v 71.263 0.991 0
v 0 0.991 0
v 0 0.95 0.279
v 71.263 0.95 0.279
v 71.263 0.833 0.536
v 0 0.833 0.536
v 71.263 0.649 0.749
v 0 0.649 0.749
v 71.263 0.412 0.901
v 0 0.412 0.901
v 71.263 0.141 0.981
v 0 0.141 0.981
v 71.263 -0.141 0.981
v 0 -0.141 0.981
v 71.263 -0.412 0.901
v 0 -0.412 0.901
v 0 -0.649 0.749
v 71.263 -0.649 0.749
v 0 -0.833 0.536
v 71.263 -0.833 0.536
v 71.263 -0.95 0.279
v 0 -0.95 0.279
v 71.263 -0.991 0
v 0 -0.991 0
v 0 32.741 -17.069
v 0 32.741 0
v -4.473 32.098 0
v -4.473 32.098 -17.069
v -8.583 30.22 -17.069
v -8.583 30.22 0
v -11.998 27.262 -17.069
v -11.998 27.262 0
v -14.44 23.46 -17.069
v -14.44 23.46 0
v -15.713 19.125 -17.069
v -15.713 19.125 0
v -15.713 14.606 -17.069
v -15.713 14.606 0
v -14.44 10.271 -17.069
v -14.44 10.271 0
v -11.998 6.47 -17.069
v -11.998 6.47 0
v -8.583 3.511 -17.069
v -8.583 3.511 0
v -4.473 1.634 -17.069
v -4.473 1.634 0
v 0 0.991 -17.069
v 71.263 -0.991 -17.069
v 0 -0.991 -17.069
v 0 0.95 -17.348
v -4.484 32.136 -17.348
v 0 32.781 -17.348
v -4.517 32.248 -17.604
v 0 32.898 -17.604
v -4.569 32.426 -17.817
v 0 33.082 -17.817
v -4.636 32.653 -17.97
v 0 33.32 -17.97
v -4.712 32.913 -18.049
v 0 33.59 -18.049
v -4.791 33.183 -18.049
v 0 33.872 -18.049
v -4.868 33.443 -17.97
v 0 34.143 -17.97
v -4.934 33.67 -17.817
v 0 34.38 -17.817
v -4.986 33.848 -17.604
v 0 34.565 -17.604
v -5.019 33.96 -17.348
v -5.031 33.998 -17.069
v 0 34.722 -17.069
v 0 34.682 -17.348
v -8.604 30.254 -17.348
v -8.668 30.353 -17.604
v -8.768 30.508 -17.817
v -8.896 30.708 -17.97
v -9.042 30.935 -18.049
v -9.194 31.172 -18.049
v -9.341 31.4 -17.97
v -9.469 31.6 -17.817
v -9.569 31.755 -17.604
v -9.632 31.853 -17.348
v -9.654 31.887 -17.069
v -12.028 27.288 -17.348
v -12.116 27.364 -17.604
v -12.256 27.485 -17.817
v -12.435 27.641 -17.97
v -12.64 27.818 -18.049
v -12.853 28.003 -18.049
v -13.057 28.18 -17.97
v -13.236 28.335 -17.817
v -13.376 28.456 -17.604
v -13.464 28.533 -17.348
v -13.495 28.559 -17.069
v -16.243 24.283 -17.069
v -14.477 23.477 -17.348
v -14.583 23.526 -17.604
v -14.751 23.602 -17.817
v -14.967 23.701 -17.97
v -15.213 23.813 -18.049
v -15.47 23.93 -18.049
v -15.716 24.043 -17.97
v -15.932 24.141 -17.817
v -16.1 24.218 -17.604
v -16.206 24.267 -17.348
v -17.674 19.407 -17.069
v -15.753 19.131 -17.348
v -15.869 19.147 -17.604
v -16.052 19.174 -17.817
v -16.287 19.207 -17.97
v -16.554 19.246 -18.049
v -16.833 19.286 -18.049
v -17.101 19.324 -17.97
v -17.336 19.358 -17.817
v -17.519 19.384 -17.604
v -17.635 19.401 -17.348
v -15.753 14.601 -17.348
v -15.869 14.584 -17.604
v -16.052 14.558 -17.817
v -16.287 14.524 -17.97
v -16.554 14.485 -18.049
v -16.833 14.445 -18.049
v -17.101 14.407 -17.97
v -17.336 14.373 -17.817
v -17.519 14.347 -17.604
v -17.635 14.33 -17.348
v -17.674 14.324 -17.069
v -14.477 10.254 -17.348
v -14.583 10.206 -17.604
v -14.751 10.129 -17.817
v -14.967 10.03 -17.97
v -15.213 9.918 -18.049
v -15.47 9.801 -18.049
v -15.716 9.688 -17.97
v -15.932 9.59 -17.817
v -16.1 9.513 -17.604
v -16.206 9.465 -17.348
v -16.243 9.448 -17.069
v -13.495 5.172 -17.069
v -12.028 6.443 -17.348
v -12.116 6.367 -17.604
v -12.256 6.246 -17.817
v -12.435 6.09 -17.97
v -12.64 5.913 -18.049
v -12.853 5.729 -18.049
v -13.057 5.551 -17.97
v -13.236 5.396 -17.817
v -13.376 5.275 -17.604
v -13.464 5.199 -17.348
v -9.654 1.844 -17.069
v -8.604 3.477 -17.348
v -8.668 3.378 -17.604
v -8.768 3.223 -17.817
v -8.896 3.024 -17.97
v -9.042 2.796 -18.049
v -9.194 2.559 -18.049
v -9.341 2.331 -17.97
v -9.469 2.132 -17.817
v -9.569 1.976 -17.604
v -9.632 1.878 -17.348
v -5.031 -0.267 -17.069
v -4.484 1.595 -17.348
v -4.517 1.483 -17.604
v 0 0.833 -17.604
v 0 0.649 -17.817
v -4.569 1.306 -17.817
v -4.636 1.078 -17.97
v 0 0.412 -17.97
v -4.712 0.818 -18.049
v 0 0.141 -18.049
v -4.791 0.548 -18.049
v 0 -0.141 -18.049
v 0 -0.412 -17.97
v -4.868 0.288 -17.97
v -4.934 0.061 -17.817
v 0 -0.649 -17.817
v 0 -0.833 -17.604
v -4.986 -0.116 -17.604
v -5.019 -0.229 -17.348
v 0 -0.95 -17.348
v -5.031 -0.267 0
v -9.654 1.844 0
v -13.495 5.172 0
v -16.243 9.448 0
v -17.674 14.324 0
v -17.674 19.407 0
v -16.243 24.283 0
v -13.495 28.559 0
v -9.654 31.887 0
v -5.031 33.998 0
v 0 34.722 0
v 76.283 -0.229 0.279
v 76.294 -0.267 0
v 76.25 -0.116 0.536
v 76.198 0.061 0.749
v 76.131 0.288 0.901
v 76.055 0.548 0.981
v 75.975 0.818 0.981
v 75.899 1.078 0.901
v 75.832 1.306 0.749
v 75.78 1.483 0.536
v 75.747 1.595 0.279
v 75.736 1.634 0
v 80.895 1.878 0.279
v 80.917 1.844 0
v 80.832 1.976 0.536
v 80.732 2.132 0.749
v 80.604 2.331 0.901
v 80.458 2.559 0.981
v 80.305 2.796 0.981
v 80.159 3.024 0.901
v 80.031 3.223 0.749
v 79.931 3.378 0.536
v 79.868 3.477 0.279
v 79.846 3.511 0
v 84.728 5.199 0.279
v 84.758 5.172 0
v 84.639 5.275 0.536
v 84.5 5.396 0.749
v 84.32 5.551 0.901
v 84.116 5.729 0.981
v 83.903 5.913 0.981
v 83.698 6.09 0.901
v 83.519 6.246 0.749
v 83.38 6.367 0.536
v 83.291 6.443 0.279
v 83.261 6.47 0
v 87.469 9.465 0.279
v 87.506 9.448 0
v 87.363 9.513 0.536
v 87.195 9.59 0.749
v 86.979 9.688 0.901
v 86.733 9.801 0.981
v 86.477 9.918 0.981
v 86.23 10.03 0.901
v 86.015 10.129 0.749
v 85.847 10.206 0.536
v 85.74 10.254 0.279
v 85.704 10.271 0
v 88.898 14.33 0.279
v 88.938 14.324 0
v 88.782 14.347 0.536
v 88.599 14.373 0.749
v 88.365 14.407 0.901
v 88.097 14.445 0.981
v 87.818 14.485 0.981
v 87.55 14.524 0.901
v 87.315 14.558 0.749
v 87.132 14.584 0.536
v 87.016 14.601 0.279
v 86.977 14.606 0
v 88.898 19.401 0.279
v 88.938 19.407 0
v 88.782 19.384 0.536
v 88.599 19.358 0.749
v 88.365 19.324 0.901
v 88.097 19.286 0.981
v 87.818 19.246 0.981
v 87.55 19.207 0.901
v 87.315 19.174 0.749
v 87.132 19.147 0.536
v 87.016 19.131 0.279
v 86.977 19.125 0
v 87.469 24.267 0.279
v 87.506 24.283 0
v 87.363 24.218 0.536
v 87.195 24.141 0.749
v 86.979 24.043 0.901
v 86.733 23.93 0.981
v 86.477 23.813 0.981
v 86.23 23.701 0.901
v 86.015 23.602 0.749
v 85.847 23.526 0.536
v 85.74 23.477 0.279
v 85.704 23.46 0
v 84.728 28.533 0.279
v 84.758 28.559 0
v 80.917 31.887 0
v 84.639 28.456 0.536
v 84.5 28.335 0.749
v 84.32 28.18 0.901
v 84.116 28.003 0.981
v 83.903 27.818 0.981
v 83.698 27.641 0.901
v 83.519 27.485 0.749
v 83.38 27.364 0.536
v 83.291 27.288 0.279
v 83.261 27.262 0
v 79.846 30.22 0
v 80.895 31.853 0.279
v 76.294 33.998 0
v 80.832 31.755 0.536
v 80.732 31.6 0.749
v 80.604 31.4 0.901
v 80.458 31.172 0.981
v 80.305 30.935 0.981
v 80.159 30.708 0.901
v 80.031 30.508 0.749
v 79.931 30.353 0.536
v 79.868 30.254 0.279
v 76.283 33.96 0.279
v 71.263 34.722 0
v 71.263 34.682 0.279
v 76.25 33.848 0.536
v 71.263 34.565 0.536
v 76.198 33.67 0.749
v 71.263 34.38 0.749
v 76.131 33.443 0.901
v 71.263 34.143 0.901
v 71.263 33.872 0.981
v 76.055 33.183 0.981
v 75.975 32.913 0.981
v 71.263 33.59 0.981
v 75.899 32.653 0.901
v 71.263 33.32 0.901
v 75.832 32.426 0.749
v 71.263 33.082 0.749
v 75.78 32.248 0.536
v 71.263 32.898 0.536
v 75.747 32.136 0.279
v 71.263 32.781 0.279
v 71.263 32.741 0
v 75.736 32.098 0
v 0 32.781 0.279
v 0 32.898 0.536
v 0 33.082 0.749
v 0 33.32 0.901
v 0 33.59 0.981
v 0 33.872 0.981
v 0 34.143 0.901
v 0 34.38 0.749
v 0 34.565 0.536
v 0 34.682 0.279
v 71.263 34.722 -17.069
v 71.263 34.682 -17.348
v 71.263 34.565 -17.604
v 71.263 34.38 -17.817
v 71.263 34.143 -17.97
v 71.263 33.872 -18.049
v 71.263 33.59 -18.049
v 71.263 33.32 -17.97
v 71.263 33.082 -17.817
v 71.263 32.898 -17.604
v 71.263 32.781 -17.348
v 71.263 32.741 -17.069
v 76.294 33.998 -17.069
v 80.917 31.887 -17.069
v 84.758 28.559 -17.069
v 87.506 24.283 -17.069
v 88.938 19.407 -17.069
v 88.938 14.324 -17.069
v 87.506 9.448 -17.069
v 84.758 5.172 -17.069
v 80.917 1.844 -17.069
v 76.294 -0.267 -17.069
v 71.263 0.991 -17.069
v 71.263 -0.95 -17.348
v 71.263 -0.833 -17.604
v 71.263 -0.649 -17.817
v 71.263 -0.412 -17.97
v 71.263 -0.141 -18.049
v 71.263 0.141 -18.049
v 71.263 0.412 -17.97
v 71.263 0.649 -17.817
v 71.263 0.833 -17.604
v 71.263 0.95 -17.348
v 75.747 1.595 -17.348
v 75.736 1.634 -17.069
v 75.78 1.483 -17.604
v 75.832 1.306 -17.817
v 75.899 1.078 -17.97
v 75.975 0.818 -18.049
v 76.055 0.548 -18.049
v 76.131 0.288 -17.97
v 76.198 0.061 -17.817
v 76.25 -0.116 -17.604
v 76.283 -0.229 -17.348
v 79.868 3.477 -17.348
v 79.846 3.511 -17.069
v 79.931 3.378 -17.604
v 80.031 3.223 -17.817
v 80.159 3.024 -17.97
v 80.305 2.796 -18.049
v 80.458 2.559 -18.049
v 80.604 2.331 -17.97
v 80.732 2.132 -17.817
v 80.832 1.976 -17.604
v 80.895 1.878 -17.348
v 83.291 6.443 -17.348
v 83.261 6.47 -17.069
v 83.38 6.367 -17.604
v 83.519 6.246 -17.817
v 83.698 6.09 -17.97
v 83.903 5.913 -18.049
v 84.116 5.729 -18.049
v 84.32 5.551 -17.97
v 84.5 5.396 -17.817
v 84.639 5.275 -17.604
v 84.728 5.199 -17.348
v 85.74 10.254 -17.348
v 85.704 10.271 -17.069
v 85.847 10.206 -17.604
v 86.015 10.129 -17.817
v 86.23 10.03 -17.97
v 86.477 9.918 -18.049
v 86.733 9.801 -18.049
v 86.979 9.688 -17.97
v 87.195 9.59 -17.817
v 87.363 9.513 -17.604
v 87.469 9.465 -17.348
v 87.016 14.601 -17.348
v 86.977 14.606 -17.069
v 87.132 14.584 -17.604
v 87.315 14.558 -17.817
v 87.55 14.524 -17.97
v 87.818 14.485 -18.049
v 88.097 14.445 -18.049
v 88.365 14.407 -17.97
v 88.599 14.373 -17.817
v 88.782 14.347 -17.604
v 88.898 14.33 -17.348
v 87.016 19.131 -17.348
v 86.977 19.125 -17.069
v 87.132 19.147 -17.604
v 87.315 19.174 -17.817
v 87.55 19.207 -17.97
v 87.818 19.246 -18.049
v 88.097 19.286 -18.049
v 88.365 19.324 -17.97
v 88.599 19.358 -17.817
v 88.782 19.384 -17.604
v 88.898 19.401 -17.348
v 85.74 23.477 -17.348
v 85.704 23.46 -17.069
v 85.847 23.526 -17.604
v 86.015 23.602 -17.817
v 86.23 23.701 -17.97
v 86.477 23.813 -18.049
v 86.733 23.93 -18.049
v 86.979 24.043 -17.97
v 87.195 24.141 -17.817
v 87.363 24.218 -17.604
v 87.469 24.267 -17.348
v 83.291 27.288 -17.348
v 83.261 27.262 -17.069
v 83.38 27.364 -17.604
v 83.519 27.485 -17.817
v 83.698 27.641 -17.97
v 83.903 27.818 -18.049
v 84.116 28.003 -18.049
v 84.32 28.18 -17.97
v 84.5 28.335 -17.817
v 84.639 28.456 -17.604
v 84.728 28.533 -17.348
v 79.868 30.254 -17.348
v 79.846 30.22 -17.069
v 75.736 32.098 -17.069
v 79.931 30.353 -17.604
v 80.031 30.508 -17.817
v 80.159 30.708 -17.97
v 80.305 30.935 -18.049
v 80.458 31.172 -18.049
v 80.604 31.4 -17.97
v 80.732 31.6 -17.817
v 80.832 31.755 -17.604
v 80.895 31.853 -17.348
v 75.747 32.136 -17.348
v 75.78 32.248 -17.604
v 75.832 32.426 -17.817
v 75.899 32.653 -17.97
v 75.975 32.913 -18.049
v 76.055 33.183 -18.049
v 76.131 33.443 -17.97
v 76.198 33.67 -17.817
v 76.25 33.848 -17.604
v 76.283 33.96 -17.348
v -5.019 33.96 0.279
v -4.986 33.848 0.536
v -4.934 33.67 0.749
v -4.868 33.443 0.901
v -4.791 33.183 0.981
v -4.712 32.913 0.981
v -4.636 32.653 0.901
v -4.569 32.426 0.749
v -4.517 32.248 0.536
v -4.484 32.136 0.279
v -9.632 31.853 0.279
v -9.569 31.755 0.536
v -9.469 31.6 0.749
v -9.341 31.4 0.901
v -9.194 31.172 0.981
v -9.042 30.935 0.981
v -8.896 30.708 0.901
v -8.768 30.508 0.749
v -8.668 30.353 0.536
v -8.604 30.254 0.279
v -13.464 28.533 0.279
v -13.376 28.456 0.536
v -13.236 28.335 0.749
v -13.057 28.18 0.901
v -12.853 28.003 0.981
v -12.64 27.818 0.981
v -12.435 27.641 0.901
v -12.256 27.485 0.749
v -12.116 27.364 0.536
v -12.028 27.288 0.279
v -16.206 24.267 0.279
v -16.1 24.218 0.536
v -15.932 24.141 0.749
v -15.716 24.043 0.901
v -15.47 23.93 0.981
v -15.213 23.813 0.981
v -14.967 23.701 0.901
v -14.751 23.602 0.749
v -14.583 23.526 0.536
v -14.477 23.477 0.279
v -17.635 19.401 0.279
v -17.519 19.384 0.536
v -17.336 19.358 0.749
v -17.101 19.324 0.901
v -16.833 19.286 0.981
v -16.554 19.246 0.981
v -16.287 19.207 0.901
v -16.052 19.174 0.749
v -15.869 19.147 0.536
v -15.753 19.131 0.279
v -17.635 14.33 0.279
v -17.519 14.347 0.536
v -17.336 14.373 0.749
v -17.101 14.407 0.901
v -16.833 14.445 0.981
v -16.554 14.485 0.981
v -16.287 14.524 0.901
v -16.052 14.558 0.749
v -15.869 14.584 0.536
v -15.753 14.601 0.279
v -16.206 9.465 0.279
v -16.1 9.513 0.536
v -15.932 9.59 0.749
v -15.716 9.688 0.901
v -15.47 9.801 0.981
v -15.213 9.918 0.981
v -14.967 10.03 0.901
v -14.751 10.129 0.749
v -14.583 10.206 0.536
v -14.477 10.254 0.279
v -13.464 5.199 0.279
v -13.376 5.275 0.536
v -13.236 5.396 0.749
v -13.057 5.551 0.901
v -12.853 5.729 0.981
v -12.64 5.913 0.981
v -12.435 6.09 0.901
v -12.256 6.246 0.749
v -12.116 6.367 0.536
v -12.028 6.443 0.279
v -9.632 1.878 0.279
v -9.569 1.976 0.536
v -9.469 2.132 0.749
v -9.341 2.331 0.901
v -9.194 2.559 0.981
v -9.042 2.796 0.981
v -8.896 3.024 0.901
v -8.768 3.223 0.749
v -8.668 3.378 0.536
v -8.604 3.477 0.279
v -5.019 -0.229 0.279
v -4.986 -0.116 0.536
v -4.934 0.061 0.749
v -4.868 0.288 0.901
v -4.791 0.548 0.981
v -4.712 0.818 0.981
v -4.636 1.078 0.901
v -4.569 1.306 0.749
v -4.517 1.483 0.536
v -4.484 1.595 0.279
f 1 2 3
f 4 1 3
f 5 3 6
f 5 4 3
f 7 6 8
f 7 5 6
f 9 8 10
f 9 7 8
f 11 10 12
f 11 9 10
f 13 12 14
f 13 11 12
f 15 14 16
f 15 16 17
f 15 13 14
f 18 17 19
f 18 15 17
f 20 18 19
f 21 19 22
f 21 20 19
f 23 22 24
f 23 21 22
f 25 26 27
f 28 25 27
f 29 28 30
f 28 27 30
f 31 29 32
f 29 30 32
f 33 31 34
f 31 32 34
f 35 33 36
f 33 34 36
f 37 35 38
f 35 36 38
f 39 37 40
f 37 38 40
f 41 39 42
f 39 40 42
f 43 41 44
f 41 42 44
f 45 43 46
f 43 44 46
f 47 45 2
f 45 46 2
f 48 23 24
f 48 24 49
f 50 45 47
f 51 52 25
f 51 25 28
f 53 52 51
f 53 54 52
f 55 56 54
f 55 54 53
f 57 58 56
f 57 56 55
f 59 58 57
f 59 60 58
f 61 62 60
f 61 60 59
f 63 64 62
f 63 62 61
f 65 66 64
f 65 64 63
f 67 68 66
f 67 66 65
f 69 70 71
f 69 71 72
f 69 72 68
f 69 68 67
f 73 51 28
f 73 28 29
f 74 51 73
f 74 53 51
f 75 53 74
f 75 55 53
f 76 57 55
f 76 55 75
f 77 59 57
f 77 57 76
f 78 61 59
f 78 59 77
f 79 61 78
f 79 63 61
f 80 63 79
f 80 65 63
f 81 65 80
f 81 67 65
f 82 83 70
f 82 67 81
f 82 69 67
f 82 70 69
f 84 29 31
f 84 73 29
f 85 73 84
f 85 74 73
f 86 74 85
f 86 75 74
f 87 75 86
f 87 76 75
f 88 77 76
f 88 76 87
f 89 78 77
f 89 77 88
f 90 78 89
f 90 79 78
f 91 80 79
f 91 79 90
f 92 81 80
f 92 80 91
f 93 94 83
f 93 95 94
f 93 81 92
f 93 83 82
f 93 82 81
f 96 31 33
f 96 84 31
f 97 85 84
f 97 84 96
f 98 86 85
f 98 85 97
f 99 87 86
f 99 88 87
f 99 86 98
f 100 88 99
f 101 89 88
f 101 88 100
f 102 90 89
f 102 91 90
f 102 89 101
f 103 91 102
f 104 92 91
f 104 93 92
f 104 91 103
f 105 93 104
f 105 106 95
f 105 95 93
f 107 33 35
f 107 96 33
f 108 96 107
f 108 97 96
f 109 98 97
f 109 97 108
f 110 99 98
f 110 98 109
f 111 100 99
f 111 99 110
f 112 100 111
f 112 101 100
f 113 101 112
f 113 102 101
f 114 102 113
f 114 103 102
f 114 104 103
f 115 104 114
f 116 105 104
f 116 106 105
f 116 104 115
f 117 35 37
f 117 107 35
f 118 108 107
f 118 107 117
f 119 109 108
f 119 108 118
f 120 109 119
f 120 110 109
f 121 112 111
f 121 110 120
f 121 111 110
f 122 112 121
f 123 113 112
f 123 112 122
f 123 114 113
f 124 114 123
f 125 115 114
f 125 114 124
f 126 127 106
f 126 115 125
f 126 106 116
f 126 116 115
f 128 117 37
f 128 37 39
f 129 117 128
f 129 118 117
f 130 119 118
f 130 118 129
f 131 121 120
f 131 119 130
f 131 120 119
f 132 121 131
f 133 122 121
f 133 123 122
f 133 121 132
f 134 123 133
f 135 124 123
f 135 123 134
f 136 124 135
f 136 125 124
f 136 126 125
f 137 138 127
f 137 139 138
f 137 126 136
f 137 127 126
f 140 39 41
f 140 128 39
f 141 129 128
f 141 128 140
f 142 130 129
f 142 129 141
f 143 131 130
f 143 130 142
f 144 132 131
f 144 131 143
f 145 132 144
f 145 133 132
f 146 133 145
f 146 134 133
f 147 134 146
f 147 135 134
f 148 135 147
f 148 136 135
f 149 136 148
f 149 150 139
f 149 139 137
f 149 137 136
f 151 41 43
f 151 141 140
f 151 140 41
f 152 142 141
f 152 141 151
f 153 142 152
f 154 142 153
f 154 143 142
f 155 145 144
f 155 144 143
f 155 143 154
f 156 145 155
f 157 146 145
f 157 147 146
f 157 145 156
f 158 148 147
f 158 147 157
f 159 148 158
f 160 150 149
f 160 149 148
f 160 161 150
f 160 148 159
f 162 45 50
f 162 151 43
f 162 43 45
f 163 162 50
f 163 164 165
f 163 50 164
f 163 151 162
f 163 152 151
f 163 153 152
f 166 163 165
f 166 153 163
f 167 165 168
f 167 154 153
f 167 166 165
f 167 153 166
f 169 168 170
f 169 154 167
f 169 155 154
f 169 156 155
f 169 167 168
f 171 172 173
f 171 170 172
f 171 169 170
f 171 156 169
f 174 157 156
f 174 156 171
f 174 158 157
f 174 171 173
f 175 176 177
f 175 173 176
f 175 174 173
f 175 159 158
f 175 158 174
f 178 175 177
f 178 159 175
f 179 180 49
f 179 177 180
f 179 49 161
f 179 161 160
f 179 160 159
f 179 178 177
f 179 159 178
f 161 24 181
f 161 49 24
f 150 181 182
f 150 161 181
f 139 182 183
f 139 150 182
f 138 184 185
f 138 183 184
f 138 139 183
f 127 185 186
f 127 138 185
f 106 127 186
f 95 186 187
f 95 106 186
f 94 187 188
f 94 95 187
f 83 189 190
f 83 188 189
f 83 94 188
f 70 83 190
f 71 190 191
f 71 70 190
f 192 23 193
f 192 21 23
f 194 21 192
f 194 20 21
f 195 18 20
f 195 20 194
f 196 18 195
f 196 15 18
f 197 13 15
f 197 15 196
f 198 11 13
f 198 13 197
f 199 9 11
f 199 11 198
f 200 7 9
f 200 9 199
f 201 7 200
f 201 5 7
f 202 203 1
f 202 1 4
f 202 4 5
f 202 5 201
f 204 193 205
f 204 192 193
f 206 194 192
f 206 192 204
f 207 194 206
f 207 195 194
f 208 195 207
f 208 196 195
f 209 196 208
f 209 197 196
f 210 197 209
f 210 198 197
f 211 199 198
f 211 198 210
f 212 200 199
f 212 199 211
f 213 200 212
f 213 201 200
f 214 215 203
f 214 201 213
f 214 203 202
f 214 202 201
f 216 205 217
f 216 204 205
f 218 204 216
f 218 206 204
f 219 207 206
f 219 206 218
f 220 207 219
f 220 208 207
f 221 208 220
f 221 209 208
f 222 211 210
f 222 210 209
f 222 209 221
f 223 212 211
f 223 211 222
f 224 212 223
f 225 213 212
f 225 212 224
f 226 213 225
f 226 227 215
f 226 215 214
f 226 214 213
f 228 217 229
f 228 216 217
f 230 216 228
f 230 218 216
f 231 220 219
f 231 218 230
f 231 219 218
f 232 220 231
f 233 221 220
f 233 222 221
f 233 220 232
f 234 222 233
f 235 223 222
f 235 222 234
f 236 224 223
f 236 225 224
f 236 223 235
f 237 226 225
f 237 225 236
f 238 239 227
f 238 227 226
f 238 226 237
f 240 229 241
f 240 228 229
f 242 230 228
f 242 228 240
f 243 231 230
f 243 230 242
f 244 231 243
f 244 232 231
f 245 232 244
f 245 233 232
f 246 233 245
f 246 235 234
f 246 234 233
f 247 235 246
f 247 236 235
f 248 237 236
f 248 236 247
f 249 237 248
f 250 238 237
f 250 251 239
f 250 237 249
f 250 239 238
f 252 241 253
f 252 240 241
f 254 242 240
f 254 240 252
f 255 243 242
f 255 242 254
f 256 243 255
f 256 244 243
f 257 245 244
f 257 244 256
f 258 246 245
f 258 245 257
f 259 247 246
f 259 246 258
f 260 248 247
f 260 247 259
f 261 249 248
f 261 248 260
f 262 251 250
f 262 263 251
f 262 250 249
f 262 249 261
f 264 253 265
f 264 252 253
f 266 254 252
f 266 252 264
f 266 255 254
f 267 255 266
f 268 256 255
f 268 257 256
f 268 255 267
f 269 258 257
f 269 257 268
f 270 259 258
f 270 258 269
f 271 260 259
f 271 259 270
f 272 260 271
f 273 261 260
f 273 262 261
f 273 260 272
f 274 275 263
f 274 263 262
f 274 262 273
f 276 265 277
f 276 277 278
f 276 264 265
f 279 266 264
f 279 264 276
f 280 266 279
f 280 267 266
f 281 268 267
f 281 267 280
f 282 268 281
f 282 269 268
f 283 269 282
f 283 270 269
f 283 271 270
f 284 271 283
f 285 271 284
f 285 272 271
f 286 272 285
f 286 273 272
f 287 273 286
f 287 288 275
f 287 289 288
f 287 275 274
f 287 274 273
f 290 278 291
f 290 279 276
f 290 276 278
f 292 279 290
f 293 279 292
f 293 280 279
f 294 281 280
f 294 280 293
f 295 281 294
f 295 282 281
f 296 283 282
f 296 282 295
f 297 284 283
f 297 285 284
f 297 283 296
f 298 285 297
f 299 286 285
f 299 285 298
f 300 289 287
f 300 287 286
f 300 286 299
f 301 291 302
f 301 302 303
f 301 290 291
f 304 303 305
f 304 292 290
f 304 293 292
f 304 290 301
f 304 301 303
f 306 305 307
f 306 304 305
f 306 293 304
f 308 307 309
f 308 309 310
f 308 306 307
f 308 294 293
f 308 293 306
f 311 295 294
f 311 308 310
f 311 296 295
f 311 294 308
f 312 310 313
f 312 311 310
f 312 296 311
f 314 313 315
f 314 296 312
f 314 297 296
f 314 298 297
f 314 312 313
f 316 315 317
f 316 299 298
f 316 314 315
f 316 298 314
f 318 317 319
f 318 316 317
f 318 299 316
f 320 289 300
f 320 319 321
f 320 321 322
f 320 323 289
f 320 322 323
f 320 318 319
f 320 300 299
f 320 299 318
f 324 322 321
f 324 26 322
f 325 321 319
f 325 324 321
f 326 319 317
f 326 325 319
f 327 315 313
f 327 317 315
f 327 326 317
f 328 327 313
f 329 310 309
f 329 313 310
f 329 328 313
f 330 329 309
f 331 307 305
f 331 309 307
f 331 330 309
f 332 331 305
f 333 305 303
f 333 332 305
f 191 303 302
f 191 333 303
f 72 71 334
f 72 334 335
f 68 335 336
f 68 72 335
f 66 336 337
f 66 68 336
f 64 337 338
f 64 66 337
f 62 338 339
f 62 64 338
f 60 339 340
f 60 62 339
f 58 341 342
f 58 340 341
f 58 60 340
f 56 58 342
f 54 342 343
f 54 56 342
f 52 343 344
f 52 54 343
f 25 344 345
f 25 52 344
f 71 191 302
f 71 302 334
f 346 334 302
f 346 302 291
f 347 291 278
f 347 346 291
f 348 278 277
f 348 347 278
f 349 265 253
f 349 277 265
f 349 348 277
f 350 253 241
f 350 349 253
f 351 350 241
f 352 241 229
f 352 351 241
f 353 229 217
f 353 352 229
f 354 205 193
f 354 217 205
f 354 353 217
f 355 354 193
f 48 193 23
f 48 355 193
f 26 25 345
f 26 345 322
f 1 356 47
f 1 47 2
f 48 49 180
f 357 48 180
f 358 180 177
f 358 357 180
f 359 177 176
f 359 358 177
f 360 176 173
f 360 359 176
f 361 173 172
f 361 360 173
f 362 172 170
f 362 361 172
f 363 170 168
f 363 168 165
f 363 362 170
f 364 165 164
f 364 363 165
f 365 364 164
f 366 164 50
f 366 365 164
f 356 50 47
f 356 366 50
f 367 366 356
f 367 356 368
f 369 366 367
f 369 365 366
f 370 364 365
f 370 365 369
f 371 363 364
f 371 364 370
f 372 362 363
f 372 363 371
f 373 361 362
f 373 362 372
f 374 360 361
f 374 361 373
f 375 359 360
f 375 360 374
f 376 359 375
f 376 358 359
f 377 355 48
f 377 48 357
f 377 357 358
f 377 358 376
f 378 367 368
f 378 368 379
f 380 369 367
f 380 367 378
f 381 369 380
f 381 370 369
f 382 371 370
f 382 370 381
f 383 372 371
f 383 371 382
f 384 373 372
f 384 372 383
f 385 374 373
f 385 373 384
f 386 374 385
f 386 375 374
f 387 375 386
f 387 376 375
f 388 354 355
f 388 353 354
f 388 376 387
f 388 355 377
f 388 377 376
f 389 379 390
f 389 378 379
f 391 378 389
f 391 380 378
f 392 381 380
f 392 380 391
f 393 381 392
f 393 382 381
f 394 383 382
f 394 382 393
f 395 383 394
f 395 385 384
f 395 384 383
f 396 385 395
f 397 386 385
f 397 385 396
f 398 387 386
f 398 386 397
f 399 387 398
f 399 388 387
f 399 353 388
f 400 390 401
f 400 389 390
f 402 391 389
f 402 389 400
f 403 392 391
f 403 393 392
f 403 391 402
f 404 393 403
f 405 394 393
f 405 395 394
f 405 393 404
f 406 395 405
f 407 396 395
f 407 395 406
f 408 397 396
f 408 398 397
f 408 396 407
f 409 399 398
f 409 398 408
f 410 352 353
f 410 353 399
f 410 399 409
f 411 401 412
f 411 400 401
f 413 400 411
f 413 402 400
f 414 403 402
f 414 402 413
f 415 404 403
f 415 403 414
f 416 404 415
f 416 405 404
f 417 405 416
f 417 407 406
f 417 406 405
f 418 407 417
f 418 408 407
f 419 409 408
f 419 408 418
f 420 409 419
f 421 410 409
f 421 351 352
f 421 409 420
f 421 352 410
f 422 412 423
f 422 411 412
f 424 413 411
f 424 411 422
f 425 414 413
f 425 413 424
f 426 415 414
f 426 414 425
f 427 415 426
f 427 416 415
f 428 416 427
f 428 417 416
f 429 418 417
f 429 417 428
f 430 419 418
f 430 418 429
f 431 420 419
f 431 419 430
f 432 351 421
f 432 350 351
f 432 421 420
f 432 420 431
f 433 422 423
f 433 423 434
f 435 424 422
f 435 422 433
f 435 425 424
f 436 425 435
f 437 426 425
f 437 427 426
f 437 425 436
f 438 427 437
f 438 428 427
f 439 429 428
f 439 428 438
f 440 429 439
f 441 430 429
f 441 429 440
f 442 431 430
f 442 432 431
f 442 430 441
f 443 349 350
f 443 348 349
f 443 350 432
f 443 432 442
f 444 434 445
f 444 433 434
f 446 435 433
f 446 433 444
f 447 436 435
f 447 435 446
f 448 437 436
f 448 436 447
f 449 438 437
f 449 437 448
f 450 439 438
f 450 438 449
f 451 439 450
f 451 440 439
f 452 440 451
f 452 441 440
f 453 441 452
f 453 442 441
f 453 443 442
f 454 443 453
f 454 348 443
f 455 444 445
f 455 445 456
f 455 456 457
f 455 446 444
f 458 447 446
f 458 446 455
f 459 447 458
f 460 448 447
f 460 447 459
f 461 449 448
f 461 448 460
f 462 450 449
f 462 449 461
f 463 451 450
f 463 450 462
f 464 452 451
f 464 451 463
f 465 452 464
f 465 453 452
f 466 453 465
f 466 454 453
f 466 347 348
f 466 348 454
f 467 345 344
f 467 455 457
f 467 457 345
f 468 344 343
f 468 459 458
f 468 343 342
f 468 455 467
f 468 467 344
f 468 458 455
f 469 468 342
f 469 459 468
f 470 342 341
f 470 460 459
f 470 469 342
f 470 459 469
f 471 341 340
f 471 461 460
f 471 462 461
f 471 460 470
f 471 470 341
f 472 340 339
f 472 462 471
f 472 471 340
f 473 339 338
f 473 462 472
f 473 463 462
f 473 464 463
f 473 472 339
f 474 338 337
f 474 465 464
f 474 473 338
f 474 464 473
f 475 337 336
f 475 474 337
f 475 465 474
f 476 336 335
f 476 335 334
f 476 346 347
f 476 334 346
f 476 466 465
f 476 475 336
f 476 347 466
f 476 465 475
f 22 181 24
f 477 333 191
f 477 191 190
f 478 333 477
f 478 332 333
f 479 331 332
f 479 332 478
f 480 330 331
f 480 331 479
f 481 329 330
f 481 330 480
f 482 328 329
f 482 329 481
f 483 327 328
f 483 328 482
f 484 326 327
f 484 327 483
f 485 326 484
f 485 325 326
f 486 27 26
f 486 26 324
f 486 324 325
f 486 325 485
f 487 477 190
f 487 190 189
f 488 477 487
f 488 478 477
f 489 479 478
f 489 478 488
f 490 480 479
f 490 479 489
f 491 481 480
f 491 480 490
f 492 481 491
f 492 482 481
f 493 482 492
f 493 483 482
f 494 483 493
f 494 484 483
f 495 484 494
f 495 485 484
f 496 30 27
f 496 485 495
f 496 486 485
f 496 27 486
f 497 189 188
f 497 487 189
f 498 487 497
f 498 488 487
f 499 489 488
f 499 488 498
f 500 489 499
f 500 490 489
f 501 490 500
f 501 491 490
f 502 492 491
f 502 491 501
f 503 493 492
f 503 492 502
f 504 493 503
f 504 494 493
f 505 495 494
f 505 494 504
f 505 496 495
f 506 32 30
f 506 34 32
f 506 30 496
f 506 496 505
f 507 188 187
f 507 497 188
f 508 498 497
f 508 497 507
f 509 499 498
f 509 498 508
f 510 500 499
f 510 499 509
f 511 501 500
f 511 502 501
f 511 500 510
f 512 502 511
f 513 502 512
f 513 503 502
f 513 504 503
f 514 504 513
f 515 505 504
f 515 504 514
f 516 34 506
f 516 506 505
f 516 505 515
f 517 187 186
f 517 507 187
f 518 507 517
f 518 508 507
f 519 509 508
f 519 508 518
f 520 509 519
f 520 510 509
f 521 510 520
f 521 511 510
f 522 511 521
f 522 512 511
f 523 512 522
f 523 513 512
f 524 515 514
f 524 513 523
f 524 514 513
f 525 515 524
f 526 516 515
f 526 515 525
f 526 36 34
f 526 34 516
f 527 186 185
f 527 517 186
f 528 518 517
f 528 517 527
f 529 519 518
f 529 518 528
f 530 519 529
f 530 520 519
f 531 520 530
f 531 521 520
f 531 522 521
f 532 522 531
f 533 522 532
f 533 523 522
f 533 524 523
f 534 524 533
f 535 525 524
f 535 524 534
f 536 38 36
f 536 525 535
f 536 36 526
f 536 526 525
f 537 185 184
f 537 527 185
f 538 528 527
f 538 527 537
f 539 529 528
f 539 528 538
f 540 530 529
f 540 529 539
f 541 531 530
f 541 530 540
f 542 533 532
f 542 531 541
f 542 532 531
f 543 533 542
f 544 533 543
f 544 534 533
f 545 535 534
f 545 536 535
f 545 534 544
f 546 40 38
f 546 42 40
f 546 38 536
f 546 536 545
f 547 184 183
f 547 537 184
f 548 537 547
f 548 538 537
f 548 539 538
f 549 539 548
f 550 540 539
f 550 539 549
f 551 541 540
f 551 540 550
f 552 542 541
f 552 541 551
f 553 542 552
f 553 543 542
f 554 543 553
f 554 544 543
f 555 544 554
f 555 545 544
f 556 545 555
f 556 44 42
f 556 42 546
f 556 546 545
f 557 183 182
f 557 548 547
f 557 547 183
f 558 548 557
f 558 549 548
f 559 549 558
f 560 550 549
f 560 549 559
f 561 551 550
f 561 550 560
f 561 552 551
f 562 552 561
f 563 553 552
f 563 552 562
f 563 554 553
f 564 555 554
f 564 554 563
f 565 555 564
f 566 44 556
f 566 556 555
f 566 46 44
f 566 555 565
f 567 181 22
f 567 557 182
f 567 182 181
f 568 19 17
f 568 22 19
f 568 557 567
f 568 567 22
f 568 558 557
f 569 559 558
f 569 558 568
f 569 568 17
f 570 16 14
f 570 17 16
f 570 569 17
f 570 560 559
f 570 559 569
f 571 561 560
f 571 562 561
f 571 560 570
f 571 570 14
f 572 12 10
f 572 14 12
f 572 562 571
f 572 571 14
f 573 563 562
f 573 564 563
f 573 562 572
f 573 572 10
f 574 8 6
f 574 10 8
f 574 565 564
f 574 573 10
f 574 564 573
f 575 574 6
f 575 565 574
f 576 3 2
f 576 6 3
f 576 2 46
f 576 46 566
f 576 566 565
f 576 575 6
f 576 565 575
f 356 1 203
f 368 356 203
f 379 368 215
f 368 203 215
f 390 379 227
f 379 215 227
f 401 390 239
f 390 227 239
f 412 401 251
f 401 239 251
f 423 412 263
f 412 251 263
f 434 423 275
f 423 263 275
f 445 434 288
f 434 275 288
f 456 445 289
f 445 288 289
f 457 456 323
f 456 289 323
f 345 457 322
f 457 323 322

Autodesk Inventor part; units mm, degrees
ref_plane "YZ Plane" through (0, 0, 0) normal (1, 0, 0) x (0, 1, 0)
ref_plane "XZ Plane" through (0, 0, 0) normal (0, 1, 0) x (-1, 0, 0)
ref_plane "XY Plane" through (0, 0, 0) normal (0, 0, 1) x (1, 0, 0)
sketch "Sketch1" plane through (0, 0, 0) normal (0, 0, 1) x (1, 0, 0)
  line L0 (0, 0) -> (71.2633, 0)
  line L1 (71.2633, 33.7312) -> (0, 33.7312)
  arc A0 (0, 33.7312) -> (0, 0) centre (0, 16.8656) ccw
  arc A1 (71.2633, 0) -> (71.2633, 33.7312) centre (71.2633, 16.8656) ccw
  dimension "d2" = 16.8656
  dimension "d3" = 71.2633
sketch "Sketch2" plane through (0, 0, 0) normal (1, 0, 0) x (0, 1, 0)
  arc A0 (0.9906, 0) -> (-0.9906, 0) centre (0, 0) ccw
  line L0 (-0.9906, 0) -> (0.9906, 0) construction
  line L1 (-0.9906, 0) -> (-0.9906, -17.0688)
  line L2 (0.9906, 0) -> (0.9906, -17.0688)
  arc A1 (-0.9906, -17.0688) -> (0.9906, -17.0688) centre (0, -17.0688) ccw
  dimension "d8" = 1.9812
  dimension "d9" = 19.05
sweep "Sweep1" add profiles "Sketch2" path "Sketch1"
properties part number "Short Polycord" material "Rubber, Silicone"
